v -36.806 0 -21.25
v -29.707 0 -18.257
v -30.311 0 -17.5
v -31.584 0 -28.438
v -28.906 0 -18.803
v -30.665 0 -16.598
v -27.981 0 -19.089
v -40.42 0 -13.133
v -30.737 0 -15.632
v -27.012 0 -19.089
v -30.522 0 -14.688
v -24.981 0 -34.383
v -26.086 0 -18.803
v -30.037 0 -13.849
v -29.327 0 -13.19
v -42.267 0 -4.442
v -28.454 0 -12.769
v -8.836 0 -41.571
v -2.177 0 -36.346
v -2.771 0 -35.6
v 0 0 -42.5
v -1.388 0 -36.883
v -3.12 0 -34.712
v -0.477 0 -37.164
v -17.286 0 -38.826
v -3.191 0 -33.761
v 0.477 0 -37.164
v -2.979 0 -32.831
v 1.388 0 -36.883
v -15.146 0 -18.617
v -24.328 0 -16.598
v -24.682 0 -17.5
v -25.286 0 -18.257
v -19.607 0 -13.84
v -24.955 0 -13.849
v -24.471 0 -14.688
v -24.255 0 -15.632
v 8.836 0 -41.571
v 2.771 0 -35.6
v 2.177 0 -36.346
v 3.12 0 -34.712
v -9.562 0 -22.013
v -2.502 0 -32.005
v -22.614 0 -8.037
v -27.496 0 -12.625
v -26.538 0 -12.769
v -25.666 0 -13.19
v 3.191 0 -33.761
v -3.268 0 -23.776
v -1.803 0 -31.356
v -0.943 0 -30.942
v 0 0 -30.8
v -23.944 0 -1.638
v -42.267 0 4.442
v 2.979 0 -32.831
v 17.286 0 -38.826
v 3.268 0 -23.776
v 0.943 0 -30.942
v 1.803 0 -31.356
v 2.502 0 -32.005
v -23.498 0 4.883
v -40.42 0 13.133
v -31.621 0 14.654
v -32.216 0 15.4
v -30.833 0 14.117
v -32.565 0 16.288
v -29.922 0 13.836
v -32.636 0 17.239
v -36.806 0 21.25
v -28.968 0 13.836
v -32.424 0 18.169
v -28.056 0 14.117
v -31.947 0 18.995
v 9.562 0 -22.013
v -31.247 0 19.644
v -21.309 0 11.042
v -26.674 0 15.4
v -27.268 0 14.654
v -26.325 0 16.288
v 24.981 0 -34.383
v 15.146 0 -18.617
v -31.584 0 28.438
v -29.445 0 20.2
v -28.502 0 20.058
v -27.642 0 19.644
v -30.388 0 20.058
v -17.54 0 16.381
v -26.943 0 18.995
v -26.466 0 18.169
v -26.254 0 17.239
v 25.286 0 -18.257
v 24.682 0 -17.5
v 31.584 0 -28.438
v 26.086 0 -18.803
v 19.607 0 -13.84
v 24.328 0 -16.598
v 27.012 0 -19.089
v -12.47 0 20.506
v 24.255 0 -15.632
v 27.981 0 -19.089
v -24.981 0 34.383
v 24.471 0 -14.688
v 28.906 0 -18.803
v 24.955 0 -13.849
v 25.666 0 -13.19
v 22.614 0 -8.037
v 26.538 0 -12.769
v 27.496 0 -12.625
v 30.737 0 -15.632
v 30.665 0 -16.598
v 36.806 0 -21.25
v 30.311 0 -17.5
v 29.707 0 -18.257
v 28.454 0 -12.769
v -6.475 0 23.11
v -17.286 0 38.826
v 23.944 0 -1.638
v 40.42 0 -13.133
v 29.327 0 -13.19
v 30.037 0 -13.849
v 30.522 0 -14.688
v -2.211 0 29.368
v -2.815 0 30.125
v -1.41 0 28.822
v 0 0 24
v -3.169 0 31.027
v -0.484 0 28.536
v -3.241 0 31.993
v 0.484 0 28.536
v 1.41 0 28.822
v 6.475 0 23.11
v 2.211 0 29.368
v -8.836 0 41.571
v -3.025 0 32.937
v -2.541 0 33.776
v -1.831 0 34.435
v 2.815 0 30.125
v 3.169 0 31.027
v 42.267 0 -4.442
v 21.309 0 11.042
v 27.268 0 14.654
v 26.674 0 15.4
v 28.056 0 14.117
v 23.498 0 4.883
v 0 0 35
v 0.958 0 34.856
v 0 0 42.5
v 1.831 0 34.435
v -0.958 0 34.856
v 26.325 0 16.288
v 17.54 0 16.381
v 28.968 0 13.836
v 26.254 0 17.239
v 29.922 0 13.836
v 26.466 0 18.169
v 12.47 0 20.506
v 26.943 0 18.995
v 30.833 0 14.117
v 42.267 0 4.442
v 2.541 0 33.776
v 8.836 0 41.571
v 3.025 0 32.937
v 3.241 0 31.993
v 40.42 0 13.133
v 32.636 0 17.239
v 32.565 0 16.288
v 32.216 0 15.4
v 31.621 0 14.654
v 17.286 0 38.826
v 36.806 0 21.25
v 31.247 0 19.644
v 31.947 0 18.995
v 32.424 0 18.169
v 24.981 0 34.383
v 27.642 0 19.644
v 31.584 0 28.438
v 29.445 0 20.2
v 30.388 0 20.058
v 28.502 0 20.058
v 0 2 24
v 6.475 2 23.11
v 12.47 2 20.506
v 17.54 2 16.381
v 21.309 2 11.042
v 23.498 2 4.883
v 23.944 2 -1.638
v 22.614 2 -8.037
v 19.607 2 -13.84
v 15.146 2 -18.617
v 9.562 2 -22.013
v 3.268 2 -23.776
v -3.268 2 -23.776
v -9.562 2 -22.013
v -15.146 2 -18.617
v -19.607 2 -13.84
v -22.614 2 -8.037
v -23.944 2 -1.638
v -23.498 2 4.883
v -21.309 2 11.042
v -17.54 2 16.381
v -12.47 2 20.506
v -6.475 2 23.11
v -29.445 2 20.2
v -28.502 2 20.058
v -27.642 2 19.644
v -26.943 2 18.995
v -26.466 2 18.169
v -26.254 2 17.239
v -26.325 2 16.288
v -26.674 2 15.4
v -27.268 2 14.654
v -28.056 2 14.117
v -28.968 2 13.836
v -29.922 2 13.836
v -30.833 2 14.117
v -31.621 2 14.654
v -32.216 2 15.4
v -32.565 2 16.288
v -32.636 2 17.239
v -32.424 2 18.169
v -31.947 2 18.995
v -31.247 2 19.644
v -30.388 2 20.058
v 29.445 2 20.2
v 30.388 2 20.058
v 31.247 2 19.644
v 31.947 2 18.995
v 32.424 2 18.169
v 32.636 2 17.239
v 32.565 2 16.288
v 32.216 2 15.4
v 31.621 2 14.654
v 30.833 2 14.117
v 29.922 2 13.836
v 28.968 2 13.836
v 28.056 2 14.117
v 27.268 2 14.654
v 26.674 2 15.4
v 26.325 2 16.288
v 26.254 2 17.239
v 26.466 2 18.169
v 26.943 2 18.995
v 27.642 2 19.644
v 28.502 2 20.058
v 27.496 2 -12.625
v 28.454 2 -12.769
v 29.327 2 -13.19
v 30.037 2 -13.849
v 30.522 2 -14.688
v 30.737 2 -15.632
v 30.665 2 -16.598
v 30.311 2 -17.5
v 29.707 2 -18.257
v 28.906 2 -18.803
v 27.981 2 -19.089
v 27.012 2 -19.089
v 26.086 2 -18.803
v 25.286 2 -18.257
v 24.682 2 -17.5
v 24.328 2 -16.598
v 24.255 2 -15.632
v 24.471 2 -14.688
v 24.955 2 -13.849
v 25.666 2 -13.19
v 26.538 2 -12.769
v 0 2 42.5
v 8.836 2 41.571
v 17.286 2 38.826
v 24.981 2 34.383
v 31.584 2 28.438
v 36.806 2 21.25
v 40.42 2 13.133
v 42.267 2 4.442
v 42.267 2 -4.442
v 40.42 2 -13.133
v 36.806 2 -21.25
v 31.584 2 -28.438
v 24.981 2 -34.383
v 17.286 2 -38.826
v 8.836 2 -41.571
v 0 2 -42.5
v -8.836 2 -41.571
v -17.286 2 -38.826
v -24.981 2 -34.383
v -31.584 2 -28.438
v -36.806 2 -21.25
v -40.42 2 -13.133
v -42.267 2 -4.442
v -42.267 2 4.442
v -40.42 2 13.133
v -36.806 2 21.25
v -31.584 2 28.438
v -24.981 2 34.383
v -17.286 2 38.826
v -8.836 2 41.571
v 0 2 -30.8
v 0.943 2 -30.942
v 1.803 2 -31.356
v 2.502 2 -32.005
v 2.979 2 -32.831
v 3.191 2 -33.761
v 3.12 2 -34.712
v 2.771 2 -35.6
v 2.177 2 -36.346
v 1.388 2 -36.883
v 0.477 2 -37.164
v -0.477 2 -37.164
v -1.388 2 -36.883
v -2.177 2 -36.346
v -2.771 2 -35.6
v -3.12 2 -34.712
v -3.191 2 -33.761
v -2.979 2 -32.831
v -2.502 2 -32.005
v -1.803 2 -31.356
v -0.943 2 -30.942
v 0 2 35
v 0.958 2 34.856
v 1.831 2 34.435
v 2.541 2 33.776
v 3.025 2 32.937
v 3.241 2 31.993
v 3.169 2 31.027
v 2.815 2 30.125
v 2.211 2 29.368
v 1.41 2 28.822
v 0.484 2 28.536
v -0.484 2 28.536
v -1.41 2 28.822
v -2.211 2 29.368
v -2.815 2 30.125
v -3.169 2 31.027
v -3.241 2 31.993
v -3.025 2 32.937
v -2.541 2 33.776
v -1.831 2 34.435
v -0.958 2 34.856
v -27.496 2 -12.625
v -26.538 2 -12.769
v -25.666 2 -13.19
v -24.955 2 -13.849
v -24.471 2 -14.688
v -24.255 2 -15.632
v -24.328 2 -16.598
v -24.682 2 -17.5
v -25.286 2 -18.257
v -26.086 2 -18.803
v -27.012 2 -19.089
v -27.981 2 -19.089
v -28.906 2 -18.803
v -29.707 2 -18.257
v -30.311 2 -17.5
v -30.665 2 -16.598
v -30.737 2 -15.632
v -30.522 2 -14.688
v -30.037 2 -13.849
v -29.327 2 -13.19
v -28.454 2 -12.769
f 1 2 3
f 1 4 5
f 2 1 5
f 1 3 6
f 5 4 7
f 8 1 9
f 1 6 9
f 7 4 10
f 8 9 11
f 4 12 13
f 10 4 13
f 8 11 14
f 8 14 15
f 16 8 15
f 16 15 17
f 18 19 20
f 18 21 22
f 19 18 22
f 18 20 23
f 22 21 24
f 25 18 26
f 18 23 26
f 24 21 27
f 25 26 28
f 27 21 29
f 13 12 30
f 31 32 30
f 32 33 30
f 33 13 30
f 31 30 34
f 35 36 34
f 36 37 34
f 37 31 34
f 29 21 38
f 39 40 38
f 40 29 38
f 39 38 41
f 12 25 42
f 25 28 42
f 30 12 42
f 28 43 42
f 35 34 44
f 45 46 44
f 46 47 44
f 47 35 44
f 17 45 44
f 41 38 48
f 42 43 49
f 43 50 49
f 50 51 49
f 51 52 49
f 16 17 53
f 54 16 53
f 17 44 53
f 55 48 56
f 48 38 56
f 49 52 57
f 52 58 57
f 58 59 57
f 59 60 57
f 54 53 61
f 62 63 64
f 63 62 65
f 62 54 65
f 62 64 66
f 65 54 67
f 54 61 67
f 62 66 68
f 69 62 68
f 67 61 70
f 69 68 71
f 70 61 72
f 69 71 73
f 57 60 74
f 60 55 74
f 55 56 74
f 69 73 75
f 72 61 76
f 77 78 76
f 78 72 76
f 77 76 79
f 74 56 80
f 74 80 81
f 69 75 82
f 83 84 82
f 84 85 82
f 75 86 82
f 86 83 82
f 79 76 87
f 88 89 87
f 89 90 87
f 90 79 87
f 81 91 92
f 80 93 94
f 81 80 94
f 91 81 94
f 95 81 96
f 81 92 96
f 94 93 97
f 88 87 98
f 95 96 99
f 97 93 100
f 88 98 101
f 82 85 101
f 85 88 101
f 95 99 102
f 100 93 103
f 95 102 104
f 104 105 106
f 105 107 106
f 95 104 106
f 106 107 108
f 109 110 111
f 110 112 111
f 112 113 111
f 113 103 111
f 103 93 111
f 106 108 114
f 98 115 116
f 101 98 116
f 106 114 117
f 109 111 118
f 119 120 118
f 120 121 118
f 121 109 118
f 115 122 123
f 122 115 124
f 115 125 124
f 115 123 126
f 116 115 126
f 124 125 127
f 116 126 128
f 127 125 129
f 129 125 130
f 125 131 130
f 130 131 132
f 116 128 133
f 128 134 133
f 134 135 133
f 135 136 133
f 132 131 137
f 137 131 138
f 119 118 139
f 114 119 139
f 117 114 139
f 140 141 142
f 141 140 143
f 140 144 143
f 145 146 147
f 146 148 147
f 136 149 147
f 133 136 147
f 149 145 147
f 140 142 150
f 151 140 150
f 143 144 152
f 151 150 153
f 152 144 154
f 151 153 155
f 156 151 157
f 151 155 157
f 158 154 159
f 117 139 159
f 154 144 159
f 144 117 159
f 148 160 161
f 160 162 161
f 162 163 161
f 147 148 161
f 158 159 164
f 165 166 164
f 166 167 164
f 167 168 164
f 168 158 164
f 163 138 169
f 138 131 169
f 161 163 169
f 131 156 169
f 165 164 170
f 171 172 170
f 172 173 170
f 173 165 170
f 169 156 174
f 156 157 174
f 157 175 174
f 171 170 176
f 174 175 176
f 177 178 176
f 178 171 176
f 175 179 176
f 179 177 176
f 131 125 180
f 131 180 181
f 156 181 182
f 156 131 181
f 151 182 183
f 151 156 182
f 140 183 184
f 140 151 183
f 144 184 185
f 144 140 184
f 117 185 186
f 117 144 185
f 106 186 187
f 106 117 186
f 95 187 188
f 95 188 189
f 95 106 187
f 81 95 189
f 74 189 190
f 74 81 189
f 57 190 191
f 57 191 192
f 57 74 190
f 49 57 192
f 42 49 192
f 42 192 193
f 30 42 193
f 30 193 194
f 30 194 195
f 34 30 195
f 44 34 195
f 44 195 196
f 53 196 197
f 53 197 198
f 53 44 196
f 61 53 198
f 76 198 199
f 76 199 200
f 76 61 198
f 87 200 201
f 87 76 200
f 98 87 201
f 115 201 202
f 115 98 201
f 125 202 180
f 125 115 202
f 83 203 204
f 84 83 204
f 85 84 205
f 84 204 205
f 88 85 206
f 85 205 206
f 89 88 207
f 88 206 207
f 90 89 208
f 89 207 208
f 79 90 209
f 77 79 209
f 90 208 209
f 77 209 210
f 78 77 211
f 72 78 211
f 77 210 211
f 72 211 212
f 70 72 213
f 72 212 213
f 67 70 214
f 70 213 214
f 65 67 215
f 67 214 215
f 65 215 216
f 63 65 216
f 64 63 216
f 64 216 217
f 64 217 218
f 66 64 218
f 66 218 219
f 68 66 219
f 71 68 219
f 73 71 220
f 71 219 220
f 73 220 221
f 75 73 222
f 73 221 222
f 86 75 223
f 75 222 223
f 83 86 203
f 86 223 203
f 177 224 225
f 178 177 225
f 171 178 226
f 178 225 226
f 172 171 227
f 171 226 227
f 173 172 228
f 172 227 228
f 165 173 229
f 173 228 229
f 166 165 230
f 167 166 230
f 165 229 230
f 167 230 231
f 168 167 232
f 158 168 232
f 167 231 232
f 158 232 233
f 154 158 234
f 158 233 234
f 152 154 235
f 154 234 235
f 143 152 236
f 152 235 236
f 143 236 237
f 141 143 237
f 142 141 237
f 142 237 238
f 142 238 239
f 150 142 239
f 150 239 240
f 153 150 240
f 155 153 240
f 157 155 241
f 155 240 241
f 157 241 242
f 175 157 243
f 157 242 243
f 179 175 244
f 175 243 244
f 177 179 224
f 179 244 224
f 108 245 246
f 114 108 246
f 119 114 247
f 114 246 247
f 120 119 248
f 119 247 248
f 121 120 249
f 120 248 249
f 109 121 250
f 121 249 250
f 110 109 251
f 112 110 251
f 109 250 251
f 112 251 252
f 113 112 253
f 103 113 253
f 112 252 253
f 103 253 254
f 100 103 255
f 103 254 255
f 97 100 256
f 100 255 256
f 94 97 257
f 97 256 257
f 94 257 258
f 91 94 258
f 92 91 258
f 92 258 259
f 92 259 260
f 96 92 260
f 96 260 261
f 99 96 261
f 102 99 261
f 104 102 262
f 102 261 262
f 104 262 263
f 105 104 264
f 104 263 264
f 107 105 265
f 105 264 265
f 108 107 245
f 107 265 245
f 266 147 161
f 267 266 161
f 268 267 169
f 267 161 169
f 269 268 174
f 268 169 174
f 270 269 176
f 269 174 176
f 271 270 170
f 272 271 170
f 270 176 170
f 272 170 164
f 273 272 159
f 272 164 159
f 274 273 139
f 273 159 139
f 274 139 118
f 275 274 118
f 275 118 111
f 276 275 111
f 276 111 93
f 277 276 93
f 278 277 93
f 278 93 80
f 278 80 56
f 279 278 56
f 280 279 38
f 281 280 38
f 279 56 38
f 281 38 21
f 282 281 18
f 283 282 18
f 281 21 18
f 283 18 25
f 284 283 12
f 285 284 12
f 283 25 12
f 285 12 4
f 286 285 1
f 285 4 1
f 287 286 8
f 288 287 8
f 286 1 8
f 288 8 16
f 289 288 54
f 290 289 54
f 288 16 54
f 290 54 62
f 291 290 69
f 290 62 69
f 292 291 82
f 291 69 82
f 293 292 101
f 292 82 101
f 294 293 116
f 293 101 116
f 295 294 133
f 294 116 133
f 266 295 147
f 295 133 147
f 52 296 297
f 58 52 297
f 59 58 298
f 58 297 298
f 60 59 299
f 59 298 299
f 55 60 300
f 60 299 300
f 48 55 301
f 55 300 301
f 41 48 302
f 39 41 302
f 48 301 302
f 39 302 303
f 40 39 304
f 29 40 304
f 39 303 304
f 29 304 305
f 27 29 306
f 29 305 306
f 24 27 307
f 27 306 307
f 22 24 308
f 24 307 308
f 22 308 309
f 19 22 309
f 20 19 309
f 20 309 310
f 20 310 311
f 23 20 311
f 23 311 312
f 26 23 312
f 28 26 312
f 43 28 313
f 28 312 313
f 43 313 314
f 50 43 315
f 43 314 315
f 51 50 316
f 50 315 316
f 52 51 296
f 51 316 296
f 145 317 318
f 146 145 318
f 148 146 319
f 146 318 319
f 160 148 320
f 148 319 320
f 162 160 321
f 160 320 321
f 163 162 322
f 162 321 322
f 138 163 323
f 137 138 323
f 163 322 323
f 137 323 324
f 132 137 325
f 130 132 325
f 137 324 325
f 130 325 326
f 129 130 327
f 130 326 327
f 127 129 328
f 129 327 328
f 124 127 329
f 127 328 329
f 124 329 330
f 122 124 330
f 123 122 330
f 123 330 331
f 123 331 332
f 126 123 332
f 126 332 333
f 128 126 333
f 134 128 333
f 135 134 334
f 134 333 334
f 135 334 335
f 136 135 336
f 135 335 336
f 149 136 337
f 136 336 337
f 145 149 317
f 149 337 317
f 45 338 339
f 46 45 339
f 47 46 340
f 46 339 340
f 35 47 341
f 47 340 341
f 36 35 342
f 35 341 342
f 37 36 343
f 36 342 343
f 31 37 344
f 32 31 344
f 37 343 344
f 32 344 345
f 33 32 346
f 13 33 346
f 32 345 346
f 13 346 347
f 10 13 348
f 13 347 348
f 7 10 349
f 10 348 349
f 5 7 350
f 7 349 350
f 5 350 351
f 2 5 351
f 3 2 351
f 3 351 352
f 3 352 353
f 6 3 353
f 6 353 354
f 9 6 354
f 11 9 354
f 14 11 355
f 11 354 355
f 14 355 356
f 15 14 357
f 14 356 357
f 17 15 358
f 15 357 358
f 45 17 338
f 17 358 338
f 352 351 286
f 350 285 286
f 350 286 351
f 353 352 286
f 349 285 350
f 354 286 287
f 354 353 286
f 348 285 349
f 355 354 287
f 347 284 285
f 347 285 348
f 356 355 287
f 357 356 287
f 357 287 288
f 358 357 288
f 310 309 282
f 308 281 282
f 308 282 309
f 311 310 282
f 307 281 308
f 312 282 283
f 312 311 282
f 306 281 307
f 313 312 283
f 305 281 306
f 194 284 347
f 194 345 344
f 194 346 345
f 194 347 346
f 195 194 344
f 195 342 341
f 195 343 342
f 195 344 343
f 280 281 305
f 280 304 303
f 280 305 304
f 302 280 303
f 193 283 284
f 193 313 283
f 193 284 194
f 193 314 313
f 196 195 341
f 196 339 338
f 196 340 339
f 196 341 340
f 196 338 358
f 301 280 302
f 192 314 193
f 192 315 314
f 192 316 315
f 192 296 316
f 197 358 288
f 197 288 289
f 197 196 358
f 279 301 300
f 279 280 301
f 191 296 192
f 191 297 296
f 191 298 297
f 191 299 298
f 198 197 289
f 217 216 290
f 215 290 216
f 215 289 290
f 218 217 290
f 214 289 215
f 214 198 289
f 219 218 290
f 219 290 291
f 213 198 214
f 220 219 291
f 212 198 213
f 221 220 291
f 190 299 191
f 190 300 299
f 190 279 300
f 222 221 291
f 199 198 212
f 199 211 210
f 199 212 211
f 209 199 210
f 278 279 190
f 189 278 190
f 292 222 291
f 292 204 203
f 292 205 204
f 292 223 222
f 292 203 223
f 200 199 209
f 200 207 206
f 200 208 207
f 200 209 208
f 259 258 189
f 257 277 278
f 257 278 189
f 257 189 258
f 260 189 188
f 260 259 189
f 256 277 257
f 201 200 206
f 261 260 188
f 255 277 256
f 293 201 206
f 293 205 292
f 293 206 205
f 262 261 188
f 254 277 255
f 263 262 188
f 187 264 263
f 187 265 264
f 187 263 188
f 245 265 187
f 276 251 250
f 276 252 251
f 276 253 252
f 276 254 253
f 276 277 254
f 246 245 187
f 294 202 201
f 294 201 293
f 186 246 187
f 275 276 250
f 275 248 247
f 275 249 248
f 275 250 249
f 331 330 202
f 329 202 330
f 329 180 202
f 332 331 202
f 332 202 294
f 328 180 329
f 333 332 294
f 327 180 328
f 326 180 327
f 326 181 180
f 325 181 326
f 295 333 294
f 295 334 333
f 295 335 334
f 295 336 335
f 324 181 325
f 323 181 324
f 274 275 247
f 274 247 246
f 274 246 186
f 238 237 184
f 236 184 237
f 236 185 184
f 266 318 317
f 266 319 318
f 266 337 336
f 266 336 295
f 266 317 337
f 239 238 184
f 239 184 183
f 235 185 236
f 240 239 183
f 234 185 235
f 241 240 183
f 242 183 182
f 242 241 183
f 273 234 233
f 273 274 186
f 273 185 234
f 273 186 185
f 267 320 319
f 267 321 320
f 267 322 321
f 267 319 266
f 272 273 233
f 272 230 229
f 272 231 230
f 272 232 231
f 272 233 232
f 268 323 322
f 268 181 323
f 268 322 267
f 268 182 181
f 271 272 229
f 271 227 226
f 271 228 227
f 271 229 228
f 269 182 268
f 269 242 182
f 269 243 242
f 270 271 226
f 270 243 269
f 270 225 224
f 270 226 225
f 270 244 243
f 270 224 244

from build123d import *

# Parameters (mm, degrees)
SKETCH1_R           = 42.5
SKETCH1_R_2         = 24
BOSS_EXTRUDE1_DEPTH = 2
SKETCH3_R           = 3.25
SKETCH3_R_2         = 3.2
CUT_EXTRUDE1_DEPTH  = 2


with BuildPart() as part:
    # Sketch1 → Boss-Extrude1 (new body)
    with BuildSketch(Plane(origin=(0, 0, 0), x_dir=(1, 0, 0), z_dir=(0, 1, 0))):
        with Locations(Location((0, 0, 0), (0, 0, 270))):
            Circle(SKETCH1_R)
        with Locations(Location((0, 0, 0), (0, 0, 270))):
            Circle(SKETCH1_R_2, mode=Mode.SUBTRACT)
    extrude(amount=BOSS_EXTRUDE1_DEPTH)

    # Sketch3 → Cut-Extrude1 (cut)
    with BuildSketch(Plane(origin=(0, 2, 0), x_dir=(1, 0, 0), z_dir=(0, 1, 0))):
        with Locations(Location((0, -31.75, 0), (0, 0, 270))):
            Circle(SKETCH3_R)
        with Locations(Location((-27.49630657, 15.875, 0), (0, 0, 270))):
            Circle(SKETCH3_R)
        with Locations(Location((27.49630657, 15.875, 0), (0, 0, 270))):
            Circle(SKETCH3_R)
        with Locations(Location((0, 34, 0), (0, 0, 270))):
            Circle(SKETCH3_R_2)
        with Locations(Location((29.444863729, -17, 0), (0, 0, 270))):
            Circle(SKETCH3_R_2)
        with Locations(Location((-29.444863729, -17, 0), (0, 0, 270))):
            Circle(SKETCH3_R_2)
    extrude(amount=-CUT_EXTRUDE1_DEPTH, mode=Mode.SUBTRACT)


solid = part.part
